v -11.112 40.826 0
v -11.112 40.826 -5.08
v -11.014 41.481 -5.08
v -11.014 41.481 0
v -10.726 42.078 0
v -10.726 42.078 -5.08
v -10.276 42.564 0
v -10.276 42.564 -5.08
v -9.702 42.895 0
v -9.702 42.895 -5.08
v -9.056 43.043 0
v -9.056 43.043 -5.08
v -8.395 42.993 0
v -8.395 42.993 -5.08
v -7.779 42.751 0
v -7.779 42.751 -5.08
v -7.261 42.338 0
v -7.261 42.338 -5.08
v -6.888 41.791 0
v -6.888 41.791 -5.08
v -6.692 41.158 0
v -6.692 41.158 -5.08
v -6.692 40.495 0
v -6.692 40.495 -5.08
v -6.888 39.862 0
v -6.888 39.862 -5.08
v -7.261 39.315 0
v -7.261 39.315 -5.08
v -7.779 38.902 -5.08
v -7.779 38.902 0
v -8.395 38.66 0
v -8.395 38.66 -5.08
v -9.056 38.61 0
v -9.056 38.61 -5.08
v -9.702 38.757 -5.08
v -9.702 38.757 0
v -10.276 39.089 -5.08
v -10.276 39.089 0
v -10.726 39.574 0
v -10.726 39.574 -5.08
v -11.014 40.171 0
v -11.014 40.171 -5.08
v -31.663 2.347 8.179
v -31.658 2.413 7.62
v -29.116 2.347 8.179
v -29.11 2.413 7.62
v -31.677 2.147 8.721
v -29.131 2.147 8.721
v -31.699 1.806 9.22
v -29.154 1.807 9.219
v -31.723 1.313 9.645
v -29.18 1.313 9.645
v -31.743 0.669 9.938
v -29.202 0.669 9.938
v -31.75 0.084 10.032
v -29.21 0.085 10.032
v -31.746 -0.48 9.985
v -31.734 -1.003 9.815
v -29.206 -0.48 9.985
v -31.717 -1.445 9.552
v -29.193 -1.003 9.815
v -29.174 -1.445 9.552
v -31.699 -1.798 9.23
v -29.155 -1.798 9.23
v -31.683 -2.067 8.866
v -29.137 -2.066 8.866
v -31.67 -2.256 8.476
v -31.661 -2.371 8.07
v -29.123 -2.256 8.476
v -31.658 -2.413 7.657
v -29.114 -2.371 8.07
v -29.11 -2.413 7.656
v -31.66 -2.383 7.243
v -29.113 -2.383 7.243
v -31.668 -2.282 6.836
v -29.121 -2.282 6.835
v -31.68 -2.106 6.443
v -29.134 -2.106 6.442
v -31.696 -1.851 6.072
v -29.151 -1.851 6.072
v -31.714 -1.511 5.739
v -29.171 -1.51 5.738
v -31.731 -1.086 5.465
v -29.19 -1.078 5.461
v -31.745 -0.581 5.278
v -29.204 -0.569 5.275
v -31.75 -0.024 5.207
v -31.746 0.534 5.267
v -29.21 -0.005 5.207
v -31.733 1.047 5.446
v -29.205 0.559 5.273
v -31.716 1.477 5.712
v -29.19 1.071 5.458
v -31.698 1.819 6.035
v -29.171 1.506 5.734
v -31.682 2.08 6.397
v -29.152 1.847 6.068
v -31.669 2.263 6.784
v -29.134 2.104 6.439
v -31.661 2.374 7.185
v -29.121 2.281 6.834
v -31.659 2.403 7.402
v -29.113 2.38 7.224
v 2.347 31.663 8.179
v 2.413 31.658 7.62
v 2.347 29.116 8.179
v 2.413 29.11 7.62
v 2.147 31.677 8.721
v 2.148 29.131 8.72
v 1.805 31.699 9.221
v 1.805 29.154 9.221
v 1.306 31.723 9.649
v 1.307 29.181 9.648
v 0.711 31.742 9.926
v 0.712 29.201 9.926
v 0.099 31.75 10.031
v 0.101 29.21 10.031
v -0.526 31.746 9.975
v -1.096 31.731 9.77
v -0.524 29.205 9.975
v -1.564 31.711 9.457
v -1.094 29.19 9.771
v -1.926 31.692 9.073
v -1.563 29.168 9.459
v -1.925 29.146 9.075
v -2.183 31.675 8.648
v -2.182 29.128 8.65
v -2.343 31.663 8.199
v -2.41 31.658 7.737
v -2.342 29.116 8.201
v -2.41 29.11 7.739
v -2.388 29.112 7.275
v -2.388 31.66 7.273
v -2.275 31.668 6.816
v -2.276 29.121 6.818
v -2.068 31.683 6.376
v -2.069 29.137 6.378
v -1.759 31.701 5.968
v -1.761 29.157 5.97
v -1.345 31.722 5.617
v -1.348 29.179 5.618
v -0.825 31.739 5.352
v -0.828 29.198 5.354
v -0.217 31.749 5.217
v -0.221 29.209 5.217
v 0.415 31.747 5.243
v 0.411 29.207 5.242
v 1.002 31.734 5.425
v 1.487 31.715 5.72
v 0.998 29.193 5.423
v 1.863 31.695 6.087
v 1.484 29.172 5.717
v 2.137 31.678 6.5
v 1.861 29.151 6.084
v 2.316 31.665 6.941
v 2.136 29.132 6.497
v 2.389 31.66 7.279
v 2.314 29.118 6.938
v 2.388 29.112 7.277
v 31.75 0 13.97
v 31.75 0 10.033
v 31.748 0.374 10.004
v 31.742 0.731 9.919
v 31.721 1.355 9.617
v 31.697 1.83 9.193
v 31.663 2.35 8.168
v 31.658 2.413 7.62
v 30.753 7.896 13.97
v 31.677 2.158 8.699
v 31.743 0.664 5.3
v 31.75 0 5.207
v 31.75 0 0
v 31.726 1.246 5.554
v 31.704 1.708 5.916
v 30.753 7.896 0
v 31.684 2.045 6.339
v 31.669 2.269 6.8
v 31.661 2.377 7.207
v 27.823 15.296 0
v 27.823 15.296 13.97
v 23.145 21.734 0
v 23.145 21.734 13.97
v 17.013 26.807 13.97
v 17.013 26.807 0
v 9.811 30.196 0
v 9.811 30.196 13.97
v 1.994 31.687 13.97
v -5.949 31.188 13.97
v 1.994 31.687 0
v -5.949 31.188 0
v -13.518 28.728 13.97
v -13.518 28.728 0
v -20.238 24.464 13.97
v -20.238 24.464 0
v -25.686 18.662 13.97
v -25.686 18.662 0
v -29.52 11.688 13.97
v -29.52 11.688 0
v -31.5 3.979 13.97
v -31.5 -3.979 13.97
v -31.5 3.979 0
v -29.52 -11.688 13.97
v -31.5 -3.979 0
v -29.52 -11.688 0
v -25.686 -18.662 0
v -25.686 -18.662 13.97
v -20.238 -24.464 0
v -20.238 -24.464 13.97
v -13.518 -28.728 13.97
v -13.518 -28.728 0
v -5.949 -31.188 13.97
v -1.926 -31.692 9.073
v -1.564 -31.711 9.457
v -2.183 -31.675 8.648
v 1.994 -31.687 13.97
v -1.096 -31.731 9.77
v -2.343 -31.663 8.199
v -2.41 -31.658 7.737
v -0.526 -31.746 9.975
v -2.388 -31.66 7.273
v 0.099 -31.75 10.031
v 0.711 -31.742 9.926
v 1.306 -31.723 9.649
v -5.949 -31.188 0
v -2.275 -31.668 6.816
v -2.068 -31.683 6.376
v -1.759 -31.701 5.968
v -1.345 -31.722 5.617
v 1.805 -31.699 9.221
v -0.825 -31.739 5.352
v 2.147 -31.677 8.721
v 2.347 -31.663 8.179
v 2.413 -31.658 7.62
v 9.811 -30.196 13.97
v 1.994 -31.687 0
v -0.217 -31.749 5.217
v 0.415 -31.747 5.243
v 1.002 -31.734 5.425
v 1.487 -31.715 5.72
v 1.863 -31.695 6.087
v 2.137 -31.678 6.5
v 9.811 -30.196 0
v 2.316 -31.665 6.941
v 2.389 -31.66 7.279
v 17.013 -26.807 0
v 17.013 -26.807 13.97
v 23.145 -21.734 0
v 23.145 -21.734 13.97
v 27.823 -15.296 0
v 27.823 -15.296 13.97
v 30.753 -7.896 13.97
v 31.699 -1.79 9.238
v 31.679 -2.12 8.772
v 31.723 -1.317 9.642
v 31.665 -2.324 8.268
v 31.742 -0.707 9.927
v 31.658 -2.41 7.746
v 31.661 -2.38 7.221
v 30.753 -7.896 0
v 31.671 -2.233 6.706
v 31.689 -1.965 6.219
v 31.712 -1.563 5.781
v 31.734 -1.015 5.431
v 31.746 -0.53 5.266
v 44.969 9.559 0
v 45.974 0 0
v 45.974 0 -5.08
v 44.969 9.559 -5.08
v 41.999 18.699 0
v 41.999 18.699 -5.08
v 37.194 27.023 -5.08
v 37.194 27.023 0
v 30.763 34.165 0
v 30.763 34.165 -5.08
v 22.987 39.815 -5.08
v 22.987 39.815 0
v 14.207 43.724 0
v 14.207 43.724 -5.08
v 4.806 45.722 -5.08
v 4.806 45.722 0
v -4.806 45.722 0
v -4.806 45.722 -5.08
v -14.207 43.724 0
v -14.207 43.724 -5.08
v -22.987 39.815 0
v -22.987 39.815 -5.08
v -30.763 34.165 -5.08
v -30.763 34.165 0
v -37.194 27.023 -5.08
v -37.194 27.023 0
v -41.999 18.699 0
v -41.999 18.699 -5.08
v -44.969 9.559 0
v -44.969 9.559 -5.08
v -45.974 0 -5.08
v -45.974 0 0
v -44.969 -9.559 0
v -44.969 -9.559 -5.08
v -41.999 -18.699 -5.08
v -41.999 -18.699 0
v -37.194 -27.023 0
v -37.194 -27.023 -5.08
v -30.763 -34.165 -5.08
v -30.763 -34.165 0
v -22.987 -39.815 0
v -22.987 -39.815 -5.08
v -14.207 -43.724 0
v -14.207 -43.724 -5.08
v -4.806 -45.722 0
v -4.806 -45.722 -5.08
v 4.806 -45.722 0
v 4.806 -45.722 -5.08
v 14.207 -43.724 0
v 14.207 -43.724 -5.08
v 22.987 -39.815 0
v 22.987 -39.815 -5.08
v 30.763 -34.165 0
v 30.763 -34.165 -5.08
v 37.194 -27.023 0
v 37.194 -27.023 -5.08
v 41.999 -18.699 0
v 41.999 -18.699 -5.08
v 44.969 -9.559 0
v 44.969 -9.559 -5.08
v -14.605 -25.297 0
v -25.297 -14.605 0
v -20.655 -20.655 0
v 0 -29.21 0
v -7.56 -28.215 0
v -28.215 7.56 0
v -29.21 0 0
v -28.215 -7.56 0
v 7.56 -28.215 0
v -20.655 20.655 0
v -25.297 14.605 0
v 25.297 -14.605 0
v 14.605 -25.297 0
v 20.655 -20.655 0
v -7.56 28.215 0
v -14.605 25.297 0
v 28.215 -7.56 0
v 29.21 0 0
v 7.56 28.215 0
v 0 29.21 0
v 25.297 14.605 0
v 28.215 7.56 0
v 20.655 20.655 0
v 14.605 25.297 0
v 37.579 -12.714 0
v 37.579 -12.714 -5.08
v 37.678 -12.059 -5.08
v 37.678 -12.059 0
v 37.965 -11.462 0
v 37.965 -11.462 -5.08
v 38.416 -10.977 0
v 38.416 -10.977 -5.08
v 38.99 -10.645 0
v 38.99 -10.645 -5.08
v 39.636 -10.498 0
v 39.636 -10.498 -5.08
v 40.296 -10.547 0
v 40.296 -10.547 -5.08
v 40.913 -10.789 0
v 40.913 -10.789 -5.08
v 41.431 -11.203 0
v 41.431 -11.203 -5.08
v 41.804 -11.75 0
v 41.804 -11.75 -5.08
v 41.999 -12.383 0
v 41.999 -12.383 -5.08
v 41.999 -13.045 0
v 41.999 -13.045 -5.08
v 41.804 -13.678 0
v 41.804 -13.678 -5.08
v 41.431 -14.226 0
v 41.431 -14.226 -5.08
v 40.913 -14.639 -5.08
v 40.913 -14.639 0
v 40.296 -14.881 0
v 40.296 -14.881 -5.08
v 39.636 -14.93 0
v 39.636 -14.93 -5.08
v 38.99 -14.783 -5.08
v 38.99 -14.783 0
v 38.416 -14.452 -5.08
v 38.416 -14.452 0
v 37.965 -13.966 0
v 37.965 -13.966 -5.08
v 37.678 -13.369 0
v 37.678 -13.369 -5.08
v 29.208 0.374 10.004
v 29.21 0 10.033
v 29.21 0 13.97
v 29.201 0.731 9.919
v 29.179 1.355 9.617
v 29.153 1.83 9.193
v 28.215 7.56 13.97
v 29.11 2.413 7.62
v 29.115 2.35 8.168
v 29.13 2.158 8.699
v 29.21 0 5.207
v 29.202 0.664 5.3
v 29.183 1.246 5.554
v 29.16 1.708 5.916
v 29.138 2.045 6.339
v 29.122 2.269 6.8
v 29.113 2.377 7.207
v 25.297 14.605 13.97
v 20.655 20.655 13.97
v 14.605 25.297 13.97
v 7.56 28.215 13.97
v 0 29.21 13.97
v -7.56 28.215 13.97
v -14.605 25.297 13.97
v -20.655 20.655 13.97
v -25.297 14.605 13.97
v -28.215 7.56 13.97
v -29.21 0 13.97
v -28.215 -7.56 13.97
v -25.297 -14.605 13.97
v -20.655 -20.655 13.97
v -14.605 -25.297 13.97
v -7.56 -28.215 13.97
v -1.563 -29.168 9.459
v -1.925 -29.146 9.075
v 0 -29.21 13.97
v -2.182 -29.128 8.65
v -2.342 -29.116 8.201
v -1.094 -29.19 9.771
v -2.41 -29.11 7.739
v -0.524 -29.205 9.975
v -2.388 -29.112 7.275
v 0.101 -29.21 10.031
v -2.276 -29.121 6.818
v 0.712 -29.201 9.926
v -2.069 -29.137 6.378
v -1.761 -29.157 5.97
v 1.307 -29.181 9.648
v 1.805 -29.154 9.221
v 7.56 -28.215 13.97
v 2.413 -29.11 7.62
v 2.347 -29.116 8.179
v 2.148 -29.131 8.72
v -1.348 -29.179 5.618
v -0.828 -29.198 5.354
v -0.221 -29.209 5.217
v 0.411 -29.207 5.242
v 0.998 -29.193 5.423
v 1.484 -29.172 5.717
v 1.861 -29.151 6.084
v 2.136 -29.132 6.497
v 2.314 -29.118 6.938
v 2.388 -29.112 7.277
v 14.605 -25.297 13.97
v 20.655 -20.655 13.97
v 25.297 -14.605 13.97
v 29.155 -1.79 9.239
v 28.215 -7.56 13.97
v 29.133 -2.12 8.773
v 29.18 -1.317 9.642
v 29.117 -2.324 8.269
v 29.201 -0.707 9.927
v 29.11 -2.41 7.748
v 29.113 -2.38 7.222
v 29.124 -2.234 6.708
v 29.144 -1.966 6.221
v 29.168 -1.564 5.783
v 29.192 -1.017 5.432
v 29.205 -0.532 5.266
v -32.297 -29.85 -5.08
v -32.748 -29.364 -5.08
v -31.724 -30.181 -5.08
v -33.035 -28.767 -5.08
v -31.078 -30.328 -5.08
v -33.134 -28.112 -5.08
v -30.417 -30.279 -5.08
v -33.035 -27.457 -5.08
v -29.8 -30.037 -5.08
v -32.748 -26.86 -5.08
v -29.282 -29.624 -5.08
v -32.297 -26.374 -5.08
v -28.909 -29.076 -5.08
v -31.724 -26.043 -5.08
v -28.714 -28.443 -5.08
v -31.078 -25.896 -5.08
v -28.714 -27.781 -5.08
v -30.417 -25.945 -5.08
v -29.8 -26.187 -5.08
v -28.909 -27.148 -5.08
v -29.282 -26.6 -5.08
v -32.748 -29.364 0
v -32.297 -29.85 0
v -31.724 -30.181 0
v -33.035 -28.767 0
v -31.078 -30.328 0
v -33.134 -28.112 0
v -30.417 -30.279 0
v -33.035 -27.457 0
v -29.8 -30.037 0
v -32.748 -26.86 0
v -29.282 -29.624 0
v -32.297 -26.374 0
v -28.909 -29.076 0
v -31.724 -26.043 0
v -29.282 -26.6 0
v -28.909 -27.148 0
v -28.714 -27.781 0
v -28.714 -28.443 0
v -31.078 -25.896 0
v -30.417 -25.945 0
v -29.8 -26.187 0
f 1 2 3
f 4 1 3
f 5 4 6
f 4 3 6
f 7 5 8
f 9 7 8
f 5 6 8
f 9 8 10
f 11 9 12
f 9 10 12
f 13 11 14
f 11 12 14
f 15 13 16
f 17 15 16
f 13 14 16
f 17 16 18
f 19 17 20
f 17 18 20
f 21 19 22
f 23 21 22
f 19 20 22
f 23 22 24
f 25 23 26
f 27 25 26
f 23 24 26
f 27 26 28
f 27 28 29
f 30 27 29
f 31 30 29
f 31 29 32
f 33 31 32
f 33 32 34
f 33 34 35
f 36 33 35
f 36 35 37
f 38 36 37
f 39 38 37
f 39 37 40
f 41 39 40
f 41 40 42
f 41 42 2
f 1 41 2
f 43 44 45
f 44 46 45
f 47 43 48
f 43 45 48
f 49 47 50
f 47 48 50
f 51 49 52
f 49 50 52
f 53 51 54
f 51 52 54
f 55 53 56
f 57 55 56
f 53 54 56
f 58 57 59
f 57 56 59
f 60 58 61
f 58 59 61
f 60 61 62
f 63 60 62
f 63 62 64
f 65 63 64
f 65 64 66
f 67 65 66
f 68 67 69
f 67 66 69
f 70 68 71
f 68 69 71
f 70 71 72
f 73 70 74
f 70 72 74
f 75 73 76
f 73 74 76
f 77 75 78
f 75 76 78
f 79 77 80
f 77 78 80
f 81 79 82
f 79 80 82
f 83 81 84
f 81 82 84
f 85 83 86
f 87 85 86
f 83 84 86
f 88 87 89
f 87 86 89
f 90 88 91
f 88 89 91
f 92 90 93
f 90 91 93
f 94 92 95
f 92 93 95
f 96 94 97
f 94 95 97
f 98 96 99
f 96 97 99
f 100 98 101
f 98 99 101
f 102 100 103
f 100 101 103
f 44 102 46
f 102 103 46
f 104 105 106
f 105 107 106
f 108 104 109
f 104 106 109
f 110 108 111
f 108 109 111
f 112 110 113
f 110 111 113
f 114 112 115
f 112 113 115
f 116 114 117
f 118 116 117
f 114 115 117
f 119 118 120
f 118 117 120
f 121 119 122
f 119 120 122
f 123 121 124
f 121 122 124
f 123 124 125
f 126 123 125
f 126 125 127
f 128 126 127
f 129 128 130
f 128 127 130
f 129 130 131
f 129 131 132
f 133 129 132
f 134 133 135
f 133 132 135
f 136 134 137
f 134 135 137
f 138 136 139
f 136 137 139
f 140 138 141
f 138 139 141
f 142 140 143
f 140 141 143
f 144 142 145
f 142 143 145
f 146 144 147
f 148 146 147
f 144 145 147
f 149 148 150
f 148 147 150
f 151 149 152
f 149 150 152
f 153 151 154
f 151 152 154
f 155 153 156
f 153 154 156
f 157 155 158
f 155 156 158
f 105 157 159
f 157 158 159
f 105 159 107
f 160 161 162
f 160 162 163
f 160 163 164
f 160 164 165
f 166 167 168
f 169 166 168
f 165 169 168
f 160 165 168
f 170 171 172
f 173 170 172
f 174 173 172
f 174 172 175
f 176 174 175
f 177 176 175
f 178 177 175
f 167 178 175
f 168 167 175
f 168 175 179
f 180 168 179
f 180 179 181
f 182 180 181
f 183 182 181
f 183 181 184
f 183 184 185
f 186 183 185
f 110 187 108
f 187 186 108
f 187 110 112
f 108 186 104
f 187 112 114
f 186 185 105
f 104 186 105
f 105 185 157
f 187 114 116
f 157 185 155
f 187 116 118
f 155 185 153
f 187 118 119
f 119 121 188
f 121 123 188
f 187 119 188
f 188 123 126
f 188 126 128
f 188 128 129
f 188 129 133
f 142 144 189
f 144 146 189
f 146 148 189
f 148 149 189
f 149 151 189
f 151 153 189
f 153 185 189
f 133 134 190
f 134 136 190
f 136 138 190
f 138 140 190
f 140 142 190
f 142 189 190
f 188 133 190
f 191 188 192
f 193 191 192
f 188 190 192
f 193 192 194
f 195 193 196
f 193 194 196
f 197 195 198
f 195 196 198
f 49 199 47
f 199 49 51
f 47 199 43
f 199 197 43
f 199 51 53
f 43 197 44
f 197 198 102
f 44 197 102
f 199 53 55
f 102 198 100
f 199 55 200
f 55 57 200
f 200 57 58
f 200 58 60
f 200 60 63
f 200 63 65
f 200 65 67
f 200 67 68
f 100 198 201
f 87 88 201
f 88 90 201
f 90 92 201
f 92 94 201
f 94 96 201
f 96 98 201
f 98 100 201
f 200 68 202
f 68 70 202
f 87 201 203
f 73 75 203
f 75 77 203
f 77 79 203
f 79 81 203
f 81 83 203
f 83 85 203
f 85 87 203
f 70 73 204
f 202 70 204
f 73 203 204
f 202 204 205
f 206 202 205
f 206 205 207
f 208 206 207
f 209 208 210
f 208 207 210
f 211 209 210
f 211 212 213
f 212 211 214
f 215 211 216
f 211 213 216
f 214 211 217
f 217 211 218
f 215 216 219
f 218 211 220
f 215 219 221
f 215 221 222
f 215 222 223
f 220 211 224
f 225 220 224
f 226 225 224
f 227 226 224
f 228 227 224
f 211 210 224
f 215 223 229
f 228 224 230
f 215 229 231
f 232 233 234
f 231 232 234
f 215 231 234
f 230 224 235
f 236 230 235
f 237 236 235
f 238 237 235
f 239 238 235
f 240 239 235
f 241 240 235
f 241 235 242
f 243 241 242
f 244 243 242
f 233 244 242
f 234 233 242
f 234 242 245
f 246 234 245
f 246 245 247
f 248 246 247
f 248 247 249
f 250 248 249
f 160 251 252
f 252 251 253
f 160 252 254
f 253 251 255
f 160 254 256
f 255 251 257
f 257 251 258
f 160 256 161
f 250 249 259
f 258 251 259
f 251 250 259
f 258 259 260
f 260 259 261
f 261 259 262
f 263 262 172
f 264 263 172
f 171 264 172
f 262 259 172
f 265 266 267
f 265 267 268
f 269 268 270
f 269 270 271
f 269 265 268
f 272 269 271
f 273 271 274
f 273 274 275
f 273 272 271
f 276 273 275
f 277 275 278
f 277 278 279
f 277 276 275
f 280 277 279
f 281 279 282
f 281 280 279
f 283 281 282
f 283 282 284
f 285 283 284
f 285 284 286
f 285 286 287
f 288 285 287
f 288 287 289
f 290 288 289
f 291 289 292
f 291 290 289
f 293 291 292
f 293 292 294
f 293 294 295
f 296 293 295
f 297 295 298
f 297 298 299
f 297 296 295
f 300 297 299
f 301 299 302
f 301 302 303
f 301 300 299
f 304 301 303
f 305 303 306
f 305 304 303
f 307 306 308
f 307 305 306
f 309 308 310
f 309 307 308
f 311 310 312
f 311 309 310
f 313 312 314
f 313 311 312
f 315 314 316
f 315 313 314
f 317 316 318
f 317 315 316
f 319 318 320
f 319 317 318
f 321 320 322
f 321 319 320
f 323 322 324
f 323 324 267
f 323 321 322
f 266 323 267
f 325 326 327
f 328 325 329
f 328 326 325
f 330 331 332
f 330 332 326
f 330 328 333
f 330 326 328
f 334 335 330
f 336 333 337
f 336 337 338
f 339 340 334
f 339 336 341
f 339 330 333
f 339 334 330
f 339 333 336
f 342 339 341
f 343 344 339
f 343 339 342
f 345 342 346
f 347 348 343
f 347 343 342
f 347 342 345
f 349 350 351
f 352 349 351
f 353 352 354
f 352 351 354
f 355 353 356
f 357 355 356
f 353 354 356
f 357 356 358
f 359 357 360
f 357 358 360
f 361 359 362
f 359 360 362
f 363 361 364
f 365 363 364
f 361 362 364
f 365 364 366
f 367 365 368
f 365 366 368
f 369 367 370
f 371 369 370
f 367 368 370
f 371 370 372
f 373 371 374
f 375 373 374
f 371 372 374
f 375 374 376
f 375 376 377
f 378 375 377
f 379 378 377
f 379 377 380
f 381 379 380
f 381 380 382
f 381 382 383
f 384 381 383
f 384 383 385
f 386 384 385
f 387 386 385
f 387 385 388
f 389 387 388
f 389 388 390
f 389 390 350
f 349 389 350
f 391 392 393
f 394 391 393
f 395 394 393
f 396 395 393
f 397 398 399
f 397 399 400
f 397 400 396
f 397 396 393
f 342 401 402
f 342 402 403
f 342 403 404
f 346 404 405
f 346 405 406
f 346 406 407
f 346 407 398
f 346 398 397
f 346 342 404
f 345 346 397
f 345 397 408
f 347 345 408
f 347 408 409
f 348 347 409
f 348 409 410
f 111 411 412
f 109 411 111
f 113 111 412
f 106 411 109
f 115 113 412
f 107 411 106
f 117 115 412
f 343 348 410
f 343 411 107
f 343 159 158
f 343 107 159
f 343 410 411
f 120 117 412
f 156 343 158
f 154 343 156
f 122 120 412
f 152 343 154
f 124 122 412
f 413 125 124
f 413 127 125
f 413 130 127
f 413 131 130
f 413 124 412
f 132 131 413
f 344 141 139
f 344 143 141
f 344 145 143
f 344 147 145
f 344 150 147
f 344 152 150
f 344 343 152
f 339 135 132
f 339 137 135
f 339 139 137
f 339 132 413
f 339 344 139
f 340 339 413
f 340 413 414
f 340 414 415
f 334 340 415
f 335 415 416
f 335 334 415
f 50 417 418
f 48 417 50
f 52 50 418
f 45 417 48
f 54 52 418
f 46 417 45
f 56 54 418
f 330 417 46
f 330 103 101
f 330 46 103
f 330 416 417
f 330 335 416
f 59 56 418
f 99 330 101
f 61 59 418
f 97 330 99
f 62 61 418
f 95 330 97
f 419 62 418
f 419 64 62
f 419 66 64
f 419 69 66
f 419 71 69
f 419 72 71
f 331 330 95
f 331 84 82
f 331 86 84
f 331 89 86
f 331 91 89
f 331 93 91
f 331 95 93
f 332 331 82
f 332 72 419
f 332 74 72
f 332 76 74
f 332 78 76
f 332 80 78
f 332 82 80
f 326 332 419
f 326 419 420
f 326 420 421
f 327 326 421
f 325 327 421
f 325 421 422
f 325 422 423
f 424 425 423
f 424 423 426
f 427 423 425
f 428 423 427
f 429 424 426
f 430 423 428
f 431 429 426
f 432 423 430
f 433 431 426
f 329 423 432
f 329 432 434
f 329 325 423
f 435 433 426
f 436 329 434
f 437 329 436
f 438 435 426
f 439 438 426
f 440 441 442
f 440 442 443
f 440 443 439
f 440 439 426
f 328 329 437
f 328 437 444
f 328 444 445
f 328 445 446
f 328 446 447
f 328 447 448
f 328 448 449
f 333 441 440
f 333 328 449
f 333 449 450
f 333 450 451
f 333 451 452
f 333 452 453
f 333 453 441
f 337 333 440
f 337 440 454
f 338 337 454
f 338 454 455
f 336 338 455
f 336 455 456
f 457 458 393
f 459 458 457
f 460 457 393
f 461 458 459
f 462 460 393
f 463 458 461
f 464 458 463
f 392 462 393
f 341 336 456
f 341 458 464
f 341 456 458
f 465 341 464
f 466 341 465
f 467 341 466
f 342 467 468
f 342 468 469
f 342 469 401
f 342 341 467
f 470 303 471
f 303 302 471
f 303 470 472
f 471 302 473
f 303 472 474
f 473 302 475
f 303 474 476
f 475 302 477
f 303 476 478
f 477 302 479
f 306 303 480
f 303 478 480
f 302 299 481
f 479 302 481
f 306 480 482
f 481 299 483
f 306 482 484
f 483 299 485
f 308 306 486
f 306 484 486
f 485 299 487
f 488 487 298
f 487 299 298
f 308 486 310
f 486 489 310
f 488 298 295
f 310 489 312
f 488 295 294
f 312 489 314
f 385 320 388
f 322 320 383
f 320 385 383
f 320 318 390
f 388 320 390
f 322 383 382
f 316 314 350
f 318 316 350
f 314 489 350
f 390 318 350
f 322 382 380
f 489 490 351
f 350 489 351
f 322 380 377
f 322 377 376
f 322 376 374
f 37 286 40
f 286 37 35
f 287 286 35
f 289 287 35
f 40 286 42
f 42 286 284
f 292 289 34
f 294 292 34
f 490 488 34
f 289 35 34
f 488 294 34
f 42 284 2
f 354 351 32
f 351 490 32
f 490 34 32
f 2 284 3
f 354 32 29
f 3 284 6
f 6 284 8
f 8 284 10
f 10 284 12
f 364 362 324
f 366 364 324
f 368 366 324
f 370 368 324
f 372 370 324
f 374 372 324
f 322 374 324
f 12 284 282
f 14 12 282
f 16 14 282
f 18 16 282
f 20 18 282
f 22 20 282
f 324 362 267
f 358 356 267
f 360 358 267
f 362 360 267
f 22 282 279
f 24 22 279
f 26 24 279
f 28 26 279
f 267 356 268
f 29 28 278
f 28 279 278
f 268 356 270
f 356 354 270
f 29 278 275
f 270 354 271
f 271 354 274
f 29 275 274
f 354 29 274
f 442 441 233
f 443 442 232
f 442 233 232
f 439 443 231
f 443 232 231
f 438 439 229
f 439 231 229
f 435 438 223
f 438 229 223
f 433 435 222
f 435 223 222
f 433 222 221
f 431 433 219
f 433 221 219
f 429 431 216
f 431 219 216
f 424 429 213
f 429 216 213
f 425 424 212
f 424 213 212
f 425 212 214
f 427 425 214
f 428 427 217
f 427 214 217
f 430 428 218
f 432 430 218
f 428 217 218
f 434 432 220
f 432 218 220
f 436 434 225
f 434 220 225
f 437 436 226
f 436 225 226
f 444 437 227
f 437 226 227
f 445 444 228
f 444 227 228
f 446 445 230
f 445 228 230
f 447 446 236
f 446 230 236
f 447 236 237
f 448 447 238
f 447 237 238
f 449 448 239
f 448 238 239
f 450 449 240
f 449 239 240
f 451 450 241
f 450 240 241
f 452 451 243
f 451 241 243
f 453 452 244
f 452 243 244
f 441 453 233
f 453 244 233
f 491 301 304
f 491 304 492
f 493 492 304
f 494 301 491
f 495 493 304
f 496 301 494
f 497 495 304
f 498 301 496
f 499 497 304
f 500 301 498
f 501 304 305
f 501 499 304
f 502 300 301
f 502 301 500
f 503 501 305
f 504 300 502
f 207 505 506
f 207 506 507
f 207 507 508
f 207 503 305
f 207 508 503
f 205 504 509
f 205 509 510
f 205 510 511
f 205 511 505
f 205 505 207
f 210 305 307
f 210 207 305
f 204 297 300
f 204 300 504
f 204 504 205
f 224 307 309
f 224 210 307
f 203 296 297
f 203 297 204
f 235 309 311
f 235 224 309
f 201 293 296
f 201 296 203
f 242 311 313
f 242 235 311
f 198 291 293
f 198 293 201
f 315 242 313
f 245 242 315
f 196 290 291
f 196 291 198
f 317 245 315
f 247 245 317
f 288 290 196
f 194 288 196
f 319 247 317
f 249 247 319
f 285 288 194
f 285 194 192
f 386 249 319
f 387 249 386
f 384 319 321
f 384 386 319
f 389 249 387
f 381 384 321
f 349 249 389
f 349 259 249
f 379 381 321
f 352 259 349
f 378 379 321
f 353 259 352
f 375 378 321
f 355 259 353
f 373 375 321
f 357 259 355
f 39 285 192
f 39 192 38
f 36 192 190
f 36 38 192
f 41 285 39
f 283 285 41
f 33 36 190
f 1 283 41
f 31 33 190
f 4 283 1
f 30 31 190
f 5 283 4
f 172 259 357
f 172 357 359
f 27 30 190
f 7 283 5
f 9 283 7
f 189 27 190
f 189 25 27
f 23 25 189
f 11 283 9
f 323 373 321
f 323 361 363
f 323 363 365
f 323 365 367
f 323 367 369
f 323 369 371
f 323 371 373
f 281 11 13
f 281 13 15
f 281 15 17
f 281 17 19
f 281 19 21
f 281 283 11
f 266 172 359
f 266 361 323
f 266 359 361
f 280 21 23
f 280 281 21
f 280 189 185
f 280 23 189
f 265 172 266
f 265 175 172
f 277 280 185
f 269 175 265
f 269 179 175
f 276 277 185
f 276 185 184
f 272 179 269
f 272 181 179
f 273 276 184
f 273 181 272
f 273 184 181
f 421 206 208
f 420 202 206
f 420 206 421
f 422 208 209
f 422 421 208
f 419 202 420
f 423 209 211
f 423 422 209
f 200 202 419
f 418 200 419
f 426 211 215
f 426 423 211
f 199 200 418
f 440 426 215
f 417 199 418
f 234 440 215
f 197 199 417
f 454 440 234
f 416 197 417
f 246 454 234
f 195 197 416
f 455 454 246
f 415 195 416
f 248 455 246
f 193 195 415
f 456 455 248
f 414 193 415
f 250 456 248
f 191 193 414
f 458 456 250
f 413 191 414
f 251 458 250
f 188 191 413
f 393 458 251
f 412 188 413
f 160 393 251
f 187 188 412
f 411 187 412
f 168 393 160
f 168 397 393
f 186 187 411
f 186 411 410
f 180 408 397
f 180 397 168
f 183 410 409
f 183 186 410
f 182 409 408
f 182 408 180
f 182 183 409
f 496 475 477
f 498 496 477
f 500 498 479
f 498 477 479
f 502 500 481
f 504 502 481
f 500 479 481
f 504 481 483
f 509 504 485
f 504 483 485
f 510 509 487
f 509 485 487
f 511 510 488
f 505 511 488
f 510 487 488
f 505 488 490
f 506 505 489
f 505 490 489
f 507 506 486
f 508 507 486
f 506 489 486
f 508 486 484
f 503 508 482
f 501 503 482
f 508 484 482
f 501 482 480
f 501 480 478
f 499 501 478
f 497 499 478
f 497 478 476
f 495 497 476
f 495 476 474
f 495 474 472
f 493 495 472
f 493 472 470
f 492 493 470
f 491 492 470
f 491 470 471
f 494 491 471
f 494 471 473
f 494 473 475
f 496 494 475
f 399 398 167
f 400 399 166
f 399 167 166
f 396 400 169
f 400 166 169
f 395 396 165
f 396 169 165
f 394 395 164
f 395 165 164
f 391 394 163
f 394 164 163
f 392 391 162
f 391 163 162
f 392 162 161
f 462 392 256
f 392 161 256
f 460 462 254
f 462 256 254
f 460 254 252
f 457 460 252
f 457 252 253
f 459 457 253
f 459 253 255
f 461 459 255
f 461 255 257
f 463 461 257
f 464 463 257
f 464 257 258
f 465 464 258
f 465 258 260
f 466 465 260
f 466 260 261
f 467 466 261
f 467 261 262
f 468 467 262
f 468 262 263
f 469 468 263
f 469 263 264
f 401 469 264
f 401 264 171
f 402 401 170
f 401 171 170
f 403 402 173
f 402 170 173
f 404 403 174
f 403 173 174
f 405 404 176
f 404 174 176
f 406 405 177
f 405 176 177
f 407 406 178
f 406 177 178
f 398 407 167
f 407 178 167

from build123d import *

# Parameters (mm, degrees)
F0_R      = 31.75
F0_R_2    = 29.21
F1_DEPTH  = 13.97
F4_R      = 45.974
F5_DEPTH  = 5.08
F6_R      = 2.413
F7_DEPTH  = 38.1
F9_D      = 4.445
F9_DEPTH  = 12.7
F10_R     = 2.413
F11_DEPTH = 50.8


with BuildPart() as f1:
    # F0 (on Top) → F1 (new body)
    with BuildSketch(Plane.XY):
        Circle(F0_R)
        Circle(F0_R_2, mode=Mode.SUBTRACT)
    extrude(amount=F1_DEPTH)

    # F4 (on Top) → F5 (join)
    with BuildSketch(Plane.XY):
        Circle(F4_R)
    extrude(amount=-F5_DEPTH)

    # F6 (on Front) → F7 (cut, symmetric)
    with BuildSketch(Plane.XZ):
        with Locations((0, 7.62)):
            Circle(F6_R)
    extrude(amount=F7_DEPTH, both=True, mode=Mode.SUBTRACT)

    # F9
    with Locations(Plane.XY):
        with Locations((-8.89, 40.826303), (-30.911615, -28.112117), (39.801615, -12.714185)):
            Hole(F9_D / 2, depth=F9_DEPTH)

    # F10 (on Right) → F11 (cut, symmetric)
    with BuildSketch(Plane.YZ):
        with Locations((0, 7.62)):
            Circle(F10_R)
    extrude(amount=F11_DEPTH, both=True, mode=Mode.SUBTRACT)


solid = f1.part
